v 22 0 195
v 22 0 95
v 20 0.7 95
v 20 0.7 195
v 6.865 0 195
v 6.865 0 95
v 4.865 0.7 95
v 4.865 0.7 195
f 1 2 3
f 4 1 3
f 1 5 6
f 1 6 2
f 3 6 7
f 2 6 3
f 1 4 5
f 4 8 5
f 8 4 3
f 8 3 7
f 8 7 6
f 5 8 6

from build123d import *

# Parameters (mm, degrees)
SALIENTE_EXTRUIR1_DEPTH = 195
CROQUIS2_W              = 22.660700849
CROQUIS2_H              = 95
CORTAR_EXTRUIR1_DEPTH   = 0.7
CORTAR_EXTRUIR3_DEPTH   = 100


with BuildPart() as part:
    # Croquis1 → Saliente-Extruir1 (new body)
    with BuildSketch(Plane.XY):
        Polygon((0, 0), (22, 0), (20, 0.7), (0, 0.7), align=None)
    extrude(amount=SALIENTE_EXTRUIR1_DEPTH)

    # Croquis2 → Cortar-Extruir1 (cut)
    with BuildSketch(Plane.XZ):
        with Locations((11.330350425, 47.5)):
            Rectangle(CROQUIS2_W, CROQUIS2_H)
    extrude(amount=-CORTAR_EXTRUIR1_DEPTH, mode=Mode.SUBTRACT)

    # Croquis3 → Cortar-Extruir3 (cut)
    with BuildSketch(Plane(origin=(0, 0, 95), x_dir=(-1, 0, 0), z_dir=(0, 0, -1))):
        Polygon((0, 0), (0, 0.7), (-4.864557071, 0.7), (-6.864557071, 0), align=None)
    extrude(amount=-CORTAR_EXTRUIR3_DEPTH, mode=Mode.SUBTRACT)


solid = part.part
